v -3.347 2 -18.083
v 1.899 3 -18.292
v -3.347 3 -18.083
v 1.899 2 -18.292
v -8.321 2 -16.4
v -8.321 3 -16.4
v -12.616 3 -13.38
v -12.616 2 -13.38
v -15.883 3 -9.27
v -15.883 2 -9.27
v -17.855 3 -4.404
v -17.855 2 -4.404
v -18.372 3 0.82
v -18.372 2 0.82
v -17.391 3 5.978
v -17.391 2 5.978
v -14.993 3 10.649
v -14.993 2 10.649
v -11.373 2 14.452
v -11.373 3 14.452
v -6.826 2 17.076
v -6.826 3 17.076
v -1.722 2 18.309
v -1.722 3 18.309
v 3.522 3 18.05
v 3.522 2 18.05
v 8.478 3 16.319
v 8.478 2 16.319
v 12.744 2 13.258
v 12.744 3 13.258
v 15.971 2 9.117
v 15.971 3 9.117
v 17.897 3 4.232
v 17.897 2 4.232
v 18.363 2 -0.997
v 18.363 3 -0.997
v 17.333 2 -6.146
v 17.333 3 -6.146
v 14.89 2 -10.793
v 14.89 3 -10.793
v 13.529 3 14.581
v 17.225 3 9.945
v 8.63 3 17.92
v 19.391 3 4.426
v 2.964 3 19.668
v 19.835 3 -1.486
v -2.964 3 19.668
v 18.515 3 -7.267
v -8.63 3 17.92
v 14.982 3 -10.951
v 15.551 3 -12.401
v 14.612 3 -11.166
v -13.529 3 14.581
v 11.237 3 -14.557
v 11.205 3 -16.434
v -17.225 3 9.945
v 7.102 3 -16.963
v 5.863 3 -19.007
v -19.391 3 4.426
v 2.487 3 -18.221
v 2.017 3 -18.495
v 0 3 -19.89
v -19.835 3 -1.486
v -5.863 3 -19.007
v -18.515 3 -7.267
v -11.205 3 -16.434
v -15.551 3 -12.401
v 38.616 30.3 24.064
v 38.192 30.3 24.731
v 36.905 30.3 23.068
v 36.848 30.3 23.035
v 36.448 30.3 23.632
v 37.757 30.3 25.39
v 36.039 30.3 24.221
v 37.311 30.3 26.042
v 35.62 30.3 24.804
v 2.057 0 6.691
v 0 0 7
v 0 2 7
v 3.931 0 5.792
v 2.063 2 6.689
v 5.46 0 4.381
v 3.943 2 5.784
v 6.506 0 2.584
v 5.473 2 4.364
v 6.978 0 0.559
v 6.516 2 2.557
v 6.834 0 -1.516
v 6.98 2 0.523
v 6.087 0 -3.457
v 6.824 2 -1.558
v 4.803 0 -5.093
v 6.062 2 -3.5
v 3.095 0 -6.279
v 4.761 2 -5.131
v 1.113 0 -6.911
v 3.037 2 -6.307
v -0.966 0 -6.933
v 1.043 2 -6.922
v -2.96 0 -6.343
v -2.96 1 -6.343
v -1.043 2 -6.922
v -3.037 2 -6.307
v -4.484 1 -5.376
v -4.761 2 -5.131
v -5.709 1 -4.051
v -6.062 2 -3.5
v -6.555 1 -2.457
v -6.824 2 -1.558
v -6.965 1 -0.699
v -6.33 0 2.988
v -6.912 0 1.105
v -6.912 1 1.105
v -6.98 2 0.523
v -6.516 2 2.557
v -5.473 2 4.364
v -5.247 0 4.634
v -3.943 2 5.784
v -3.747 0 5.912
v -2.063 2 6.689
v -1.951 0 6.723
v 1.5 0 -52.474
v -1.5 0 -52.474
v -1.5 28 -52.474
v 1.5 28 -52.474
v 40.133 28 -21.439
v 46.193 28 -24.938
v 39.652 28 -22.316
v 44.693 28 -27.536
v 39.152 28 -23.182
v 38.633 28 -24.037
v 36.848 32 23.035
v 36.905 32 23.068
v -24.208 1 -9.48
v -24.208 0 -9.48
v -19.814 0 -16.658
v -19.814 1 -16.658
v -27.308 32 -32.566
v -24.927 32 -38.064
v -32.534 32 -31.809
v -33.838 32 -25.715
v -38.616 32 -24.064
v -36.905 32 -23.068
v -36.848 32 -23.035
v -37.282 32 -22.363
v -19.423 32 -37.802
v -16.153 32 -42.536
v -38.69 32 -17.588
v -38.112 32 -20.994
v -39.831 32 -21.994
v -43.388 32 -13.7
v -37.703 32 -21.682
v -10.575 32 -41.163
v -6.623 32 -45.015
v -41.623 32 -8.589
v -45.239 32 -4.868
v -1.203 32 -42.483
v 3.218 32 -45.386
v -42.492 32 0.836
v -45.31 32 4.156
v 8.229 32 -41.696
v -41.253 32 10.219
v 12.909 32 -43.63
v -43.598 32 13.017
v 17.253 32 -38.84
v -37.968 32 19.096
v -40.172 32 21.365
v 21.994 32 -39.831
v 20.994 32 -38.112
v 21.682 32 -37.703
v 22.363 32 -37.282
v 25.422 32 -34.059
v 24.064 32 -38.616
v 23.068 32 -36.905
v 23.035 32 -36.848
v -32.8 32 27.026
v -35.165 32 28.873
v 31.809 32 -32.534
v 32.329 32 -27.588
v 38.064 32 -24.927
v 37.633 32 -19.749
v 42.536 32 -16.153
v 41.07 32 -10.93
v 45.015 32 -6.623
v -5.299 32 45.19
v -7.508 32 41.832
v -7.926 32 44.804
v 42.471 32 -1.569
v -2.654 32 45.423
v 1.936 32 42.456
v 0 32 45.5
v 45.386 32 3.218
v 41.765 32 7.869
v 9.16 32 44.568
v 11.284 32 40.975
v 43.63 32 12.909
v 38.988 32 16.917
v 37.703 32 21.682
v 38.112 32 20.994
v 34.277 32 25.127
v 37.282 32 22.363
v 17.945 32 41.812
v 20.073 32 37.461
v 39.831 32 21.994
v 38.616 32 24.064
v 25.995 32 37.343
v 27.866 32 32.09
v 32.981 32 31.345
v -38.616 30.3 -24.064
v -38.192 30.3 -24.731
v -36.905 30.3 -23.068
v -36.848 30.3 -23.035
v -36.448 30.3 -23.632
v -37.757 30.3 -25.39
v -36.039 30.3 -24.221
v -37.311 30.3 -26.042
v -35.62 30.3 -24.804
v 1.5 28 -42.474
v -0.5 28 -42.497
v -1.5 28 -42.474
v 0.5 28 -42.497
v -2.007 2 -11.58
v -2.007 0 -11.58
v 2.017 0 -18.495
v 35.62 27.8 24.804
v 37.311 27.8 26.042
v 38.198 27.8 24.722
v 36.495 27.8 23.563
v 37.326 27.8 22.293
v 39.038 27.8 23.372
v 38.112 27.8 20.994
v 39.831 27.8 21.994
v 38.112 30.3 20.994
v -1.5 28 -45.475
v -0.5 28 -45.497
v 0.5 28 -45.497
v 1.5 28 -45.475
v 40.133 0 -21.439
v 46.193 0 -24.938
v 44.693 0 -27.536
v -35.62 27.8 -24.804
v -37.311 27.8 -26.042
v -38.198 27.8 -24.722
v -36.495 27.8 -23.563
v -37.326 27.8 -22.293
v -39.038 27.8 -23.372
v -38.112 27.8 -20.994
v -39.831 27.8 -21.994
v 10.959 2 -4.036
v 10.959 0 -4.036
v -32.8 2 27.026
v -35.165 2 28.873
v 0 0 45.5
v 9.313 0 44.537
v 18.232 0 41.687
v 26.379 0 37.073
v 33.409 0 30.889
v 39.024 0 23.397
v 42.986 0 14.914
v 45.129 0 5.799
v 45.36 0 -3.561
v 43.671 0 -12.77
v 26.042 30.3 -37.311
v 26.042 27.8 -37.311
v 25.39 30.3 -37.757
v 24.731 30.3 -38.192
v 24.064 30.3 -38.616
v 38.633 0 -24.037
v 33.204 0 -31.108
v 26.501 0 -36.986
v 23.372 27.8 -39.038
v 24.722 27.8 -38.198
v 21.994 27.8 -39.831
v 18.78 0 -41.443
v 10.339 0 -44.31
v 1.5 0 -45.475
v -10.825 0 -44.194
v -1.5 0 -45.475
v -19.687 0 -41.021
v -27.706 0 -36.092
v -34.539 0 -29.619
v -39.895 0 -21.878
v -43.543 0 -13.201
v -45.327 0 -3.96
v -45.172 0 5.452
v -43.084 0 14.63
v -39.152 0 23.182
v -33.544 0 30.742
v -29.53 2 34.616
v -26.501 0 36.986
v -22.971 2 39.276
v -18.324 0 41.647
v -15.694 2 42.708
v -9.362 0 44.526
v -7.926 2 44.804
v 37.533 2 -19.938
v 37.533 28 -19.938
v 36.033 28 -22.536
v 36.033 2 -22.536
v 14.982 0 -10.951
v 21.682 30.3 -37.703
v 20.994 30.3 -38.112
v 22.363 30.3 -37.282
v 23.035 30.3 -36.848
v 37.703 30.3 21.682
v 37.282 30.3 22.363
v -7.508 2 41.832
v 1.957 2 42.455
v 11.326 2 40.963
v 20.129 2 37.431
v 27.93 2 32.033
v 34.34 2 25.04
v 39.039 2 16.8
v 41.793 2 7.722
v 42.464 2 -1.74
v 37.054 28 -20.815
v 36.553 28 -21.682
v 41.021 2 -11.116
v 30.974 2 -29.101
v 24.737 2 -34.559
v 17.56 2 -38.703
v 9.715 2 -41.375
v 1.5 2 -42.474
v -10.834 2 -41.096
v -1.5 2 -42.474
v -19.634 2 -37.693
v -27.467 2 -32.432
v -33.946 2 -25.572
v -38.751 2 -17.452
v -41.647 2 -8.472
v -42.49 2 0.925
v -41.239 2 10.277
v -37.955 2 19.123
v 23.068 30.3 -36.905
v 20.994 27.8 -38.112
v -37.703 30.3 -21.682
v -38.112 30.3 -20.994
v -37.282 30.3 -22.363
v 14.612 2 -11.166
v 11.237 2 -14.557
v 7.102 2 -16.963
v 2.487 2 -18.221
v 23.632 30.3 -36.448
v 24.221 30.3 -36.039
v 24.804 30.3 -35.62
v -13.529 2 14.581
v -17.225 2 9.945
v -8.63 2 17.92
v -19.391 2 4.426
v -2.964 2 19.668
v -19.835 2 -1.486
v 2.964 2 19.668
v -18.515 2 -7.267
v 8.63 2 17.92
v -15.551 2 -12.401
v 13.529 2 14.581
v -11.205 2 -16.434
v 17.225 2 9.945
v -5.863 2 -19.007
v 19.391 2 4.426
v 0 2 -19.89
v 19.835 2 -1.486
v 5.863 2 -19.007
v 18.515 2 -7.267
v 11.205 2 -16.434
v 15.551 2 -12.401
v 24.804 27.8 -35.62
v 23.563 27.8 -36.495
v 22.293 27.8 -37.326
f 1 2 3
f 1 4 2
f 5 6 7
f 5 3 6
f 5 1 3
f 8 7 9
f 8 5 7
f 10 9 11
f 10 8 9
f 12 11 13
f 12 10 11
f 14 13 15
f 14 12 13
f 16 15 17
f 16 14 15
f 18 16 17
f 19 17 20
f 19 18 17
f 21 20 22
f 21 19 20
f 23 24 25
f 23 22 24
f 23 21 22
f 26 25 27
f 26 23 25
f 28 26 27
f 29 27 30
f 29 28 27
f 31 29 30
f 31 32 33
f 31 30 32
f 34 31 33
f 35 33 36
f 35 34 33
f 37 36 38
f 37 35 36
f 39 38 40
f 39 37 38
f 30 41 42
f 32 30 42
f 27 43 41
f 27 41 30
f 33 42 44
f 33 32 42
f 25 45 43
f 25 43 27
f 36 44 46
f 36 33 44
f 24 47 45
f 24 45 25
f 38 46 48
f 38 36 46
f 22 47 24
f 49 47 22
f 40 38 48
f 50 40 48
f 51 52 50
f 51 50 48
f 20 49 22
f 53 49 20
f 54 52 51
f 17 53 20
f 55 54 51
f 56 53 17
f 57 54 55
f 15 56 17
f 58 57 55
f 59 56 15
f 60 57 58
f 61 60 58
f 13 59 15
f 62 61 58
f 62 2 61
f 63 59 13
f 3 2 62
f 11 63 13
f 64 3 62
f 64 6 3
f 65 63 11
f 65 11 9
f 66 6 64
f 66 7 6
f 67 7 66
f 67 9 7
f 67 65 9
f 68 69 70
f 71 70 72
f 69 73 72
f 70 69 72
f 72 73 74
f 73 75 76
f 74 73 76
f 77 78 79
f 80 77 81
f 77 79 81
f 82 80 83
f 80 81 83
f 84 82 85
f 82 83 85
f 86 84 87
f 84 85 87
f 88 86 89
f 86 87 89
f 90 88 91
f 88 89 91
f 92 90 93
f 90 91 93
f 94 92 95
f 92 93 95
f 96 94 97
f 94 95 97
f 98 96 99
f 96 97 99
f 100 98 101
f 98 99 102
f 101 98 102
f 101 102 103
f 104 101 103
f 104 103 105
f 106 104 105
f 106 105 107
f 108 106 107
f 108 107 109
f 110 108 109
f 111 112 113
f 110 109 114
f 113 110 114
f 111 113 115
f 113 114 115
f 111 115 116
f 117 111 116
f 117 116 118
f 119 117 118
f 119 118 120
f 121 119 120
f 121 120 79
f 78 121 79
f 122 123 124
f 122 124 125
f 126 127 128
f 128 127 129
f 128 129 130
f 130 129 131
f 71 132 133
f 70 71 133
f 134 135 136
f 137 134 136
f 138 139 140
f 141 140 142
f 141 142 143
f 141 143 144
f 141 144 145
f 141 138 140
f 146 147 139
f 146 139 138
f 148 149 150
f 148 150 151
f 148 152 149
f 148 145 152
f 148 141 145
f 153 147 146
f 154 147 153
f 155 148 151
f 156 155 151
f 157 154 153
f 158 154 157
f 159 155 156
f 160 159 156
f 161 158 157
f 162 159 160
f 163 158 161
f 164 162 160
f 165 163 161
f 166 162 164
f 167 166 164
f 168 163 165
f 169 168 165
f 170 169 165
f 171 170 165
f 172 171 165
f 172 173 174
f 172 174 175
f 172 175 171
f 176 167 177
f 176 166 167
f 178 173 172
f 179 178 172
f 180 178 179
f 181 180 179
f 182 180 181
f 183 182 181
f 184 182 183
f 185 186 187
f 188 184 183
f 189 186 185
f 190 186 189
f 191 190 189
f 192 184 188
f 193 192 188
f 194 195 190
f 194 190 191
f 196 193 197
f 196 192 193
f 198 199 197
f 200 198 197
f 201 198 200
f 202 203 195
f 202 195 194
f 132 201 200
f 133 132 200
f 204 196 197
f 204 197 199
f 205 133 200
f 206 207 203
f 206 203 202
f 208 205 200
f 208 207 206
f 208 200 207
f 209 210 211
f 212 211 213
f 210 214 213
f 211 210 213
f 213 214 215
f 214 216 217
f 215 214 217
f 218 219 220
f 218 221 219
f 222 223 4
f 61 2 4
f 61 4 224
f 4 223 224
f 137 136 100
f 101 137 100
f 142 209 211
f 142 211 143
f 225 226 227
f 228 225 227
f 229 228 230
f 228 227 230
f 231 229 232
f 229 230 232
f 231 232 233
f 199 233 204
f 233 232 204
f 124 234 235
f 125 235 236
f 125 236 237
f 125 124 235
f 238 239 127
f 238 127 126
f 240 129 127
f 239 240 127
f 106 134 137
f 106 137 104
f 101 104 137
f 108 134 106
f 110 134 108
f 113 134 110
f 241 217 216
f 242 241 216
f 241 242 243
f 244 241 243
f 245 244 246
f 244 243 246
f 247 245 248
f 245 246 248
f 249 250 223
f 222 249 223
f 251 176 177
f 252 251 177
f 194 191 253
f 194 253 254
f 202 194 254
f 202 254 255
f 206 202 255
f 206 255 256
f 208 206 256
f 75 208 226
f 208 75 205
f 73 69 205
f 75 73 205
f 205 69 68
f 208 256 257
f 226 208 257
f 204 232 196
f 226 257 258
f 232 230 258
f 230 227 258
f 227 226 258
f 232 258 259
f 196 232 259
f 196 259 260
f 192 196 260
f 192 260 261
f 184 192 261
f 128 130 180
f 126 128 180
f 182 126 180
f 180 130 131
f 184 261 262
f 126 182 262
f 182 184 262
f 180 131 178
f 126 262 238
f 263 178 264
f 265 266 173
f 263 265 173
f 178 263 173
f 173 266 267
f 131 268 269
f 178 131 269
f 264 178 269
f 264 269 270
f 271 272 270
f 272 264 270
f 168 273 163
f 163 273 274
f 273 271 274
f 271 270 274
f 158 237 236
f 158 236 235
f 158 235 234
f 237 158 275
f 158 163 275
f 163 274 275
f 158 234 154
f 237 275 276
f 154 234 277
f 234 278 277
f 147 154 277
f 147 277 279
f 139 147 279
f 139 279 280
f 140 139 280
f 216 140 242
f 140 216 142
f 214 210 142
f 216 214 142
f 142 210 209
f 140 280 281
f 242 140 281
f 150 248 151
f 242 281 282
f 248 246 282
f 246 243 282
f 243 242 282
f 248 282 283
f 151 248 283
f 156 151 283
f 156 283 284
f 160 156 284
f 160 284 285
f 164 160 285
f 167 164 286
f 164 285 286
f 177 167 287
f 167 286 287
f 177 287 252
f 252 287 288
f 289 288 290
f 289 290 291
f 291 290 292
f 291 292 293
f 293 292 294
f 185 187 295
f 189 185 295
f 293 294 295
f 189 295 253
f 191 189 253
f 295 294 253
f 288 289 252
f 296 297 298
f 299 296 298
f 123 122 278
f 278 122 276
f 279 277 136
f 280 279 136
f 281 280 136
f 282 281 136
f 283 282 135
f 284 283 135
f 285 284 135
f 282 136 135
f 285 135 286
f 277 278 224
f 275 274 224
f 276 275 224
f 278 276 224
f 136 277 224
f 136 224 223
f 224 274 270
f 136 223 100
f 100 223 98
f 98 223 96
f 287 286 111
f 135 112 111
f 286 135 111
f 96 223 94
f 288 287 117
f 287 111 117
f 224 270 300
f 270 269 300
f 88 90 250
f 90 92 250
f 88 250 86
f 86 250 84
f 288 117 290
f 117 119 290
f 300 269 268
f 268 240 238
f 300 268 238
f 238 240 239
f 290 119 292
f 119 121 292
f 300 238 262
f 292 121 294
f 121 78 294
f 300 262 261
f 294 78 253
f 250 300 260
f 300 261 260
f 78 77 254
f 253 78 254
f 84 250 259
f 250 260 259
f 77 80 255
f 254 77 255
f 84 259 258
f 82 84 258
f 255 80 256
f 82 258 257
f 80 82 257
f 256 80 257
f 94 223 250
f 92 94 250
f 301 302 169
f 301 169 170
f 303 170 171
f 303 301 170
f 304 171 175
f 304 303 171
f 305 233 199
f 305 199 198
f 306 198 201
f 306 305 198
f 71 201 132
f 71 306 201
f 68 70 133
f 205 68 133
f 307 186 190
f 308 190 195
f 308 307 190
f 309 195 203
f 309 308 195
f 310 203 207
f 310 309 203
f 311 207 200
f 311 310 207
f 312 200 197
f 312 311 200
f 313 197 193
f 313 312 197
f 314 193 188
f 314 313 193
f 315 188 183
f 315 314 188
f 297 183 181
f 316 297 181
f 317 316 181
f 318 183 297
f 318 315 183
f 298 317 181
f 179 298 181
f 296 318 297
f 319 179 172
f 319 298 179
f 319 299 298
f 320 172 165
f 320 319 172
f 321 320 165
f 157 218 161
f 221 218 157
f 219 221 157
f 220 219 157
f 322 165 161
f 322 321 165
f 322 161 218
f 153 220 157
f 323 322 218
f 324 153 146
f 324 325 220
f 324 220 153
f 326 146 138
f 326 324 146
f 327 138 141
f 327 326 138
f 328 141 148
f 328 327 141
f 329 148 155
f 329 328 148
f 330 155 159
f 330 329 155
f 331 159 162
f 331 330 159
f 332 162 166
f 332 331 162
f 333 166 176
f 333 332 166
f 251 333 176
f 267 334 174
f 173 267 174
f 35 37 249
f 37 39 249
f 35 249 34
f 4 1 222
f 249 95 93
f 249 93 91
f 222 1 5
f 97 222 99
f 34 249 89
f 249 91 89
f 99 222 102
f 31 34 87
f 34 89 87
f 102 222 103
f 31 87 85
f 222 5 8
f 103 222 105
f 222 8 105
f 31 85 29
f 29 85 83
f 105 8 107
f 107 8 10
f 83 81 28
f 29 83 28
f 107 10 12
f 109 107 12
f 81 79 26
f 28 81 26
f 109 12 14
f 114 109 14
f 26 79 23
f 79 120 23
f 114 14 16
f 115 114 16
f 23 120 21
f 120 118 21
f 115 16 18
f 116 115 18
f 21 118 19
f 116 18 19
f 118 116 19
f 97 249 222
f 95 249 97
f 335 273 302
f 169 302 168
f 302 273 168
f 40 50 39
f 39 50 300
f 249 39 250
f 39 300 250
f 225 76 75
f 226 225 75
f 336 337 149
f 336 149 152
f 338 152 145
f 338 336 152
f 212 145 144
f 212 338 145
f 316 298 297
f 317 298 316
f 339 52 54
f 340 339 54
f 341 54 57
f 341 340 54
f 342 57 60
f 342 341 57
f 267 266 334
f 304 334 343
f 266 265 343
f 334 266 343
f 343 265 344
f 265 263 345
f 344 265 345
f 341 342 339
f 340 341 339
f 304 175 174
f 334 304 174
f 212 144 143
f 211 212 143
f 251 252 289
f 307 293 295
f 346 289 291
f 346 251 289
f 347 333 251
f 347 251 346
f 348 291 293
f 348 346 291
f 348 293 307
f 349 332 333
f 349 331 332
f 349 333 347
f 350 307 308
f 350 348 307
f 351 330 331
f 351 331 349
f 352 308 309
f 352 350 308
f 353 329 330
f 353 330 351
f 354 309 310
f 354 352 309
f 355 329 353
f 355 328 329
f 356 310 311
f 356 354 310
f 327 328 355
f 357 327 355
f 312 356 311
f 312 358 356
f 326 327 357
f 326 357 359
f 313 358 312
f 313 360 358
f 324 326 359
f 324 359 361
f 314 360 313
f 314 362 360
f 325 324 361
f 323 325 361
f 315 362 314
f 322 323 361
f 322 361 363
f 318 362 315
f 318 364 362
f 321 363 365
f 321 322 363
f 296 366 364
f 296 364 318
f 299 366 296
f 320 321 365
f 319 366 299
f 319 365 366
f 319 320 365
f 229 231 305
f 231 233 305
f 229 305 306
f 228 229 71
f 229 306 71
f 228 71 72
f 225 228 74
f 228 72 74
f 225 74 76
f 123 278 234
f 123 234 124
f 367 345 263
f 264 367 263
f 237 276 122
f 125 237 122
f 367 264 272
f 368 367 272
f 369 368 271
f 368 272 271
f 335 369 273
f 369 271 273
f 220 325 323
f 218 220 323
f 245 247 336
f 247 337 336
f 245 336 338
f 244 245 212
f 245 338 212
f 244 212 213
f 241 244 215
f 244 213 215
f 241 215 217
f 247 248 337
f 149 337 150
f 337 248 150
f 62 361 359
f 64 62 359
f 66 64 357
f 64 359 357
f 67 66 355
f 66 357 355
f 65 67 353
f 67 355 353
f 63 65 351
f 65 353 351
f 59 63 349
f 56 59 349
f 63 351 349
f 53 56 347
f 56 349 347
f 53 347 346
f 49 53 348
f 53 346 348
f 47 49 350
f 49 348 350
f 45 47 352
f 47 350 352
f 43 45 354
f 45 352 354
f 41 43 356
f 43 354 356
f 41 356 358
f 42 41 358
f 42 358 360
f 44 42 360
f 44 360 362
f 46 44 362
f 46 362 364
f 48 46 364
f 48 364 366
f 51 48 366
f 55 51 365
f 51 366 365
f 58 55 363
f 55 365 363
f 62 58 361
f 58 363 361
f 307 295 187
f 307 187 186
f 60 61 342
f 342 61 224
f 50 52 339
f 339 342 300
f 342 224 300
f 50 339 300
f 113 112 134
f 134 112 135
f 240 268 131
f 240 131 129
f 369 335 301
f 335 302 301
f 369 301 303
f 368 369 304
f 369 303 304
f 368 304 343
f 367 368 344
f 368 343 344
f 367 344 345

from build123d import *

# Parameters (mm, degrees)
SKETCH1_R                = 45.5
SKETCH1_R_2              = 42.5
BOSS_EXTRUDE1_DEPTH      = 32
SKETCH2_R                = 45.5
BOSS_EXTRUDE2_DEPTH      = 2
SKETCH3_R                = 7
CUT_EXTRUDE1_DEPTH       = 2
BOSS_EXTRUDE4_DEPTH      = 26
BOSS_EXTRUDE4_DEPTH_BACK = 2
SKETCH7_W                = 3
SKETCH7_H                = 10
SKETCH8_R                = 19.890165718
SKETCH8_R_2              = 18.390165718
BOSS_EXTRUDE5_DEPTH      = 1
CUT_EXTRUDE4_DEPTH       = 5.5
CUT_EXTRUDE5_DEPTH       = 58.5
CUT_EXTRUDE6_DEPTH       = 1
SKETCH13_W               = 2.4
SKETCH13_H               = 4.2
CUT_EXTRUDE7_DEPTH       = 2
SKETCH14_W               = 2.232083317
SKETCH14_H               = 2.5
CUT_REVOLVE1_ANGLE       = 6
CUT_REVOLVE2_START       = 30.3
CUT_REVOLVE2_DEPTH       = 1.7
CIRPATTERN1_COUNT        = 4
CUT_REVOLVE3_START       = 30.3
CUT_REVOLVE3_DEPTH       = 1.7
CUT_REVOLVE4_START       = 30.3
CUT_REVOLVE4_DEPTH       = 1.7


# Read off the part's stored shape, not the designer's step: Cut-Revolve2, Cut-Revolve3, Cut-Revolve4
with BuildPart() as part:
    # Sketch1 → Boss-Extrude1 (new body)
    with BuildSketch(Plane(origin=(0, 0, 0), x_dir=(1, 0, 0), z_dir=(0, 1, 0))):
        with Locations(Location((0, 0, 0), (0, 0, 270))):
            Circle(SKETCH1_R)
        with Locations(Location((0, 0, 0), (0, 0, 270))):
            Circle(SKETCH1_R_2, mode=Mode.SUBTRACT)
    extrude(amount=BOSS_EXTRUDE1_DEPTH)

    # Sketch2 → Boss-Extrude2 (add)
    with BuildSketch(Plane.XZ):
        with Locations(Location((0, 0, 0), (0, 0, 90))):
            Circle(SKETCH2_R)
    extrude(amount=-BOSS_EXTRUDE2_DEPTH)

    # Sketch3 → Cut-Extrude1 (cut)
    with BuildSketch(Plane(origin=(0, 2, 0), x_dir=(1, 0, 0), z_dir=(0, 1, 0))):
        with Locations(Location((0, 0, 0), (0, 0, 270))):
            Circle(SKETCH3_R)
    extrude(amount=-CUT_EXTRUDE1_DEPTH, mode=Mode.SUBTRACT)

    # Sketch7 → Boss-Extrude4 (add, two sides: drawn at the far end of the back side and taken through both)
    with BuildSketch(Plane(origin=(0, 2, 0), x_dir=(1, 0, 0), z_dir=(0, 1, 0)).offset(-BOSS_EXTRUDE4_DEPTH_BACK)):
        with Locations((0, 47.473521163)):
            Rectangle(SKETCH7_W, SKETCH7_H)
        Polygon((46.193402353, 24.937722476), (37.533148315, 19.937722476), (36.033148315, 22.535798687), (44.693402353, 27.535798687), align=None)
    extrude(amount=BOSS_EXTRUDE4_DEPTH + BOSS_EXTRUDE4_DEPTH_BACK)

    # Sketch8 → Boss-Extrude5 (add)
    with BuildSketch(Plane(origin=(0, 2, 0), x_dir=(1, 0, 0), z_dir=(0, 1, 0))):
        with Locations(Location((0, 0, 0), (0, 0, 90))):
            Circle(SKETCH8_R)
        with Locations(Location((0, 0, 0), (0, 0, 270))):
            Circle(SKETCH8_R_2, mode=Mode.SUBTRACT)
    extrude(amount=BOSS_EXTRUDE5_DEPTH)

    # Sketch10 → Cut-Extrude4 (cut)
    with BuildSketch(Plane.XZ):
        Polygon((2.016687189, -18.494703278), (14.981867268, -10.951222284), (10.958677405, -4.036459575), (-2.006502675, -11.579940569), align=None)
    extrude(amount=-CUT_EXTRUDE4_DEPTH, mode=Mode.SUBTRACT)

    # Sketch11 → Cut-Extrude5 (cut)
    with BuildSketch(Plane(origin=(0, 2, 0), x_dir=(1, 0, 0), z_dir=(0, 1, 0))):
        Polygon((-32.606600292, -26.874098434), (-35.165226496, -28.87311631), (-33.824988888, -37.754161376), (-11.7382848, -48.772412552), (-7.925983096, -44.804338986), (-7.495155029, -41.738838001), (-9.978475631, -35.419229659), (-25.965270809, -26.874098434), align=None)
    extrude(amount=CUT_EXTRUDE5_DEPTH, mode=Mode.SUBTRACT)

    # Sketch12 → Cut-Extrude6 (cut)
    with BuildSketch(Plane.XZ):
        Polygon((-6.912265346, 1.104802147), (-24.20763883, -9.480307189), (-19.814483018, -16.658435267), (-2.519109534, -6.073325931), align=None)
    extrude(amount=-CUT_EXTRUDE6_DEPTH, mode=Mode.SUBTRACT)

    # Sketch13 → Cut-Extrude7 (cut)
    with BuildSketch(Plane(origin=(22.881892348, 0, -39.327712908), x_dir=(-0.8643453386317811, 0, -0.5028987329328956), z_dir=(0.5028987329328954, 0, -0.864345338631781))):
        with Locations((-0.179431701, 29.9)):
            Rectangle(SKETCH13_W, SKETCH13_H)
    cut_extrude7 = extrude(amount=-CUT_EXTRUDE7_DEPTH, mode=Mode.SUBTRACT)

    # Sketch14 → Cut-Revolve1 (revolve, cut)
    with BuildSketch(Plane(origin=(-0.882123452, 0, -0.513242504), x_dir=(0.5028987329328954, 0, -0.8643453386317812), z_dir=(0.8643453386317812, 0, 0.5028987329328954))):
        with Locations((44.616041659, 29.05)):
            Rectangle(SKETCH14_W, SKETCH14_H)
    cut_revolve1 = revolve(axis=Axis((-0.882123452, 0, -0.513242504), (0, -1, 0)), revolution_arc=CUT_REVOLVE1_ANGLE, mode=Mode.SUBTRACT)

    # Cut-Revolve2 outline → Cut-Revolve2 (cut)
    with BuildSketch(Plane(origin=(0, 0, 0), x_dir=(1, 0, 0), z_dir=(0, 1, 0)).offset(CUT_REVOLVE2_START)):
        with BuildLine():
            ThreePointArc((20.993971431, 38.112264735), (22.023249251, 37.494236289), (23.035079503, 36.848038538))
            Line((23.035079503, 36.848038538), (23.068400244, 36.905307776))
            Line((23.068400244, 36.905307776), (20.993971431, 38.112264735))
        make_face()
    extrude(amount=CUT_REVOLVE2_DEPTH, mode=Mode.SUBTRACT)

    # CirPattern1: Cut-Extrude7, Cut-Revolve1 ×4 about axis
    cirpattern1_axis = Axis((0, 0, 0), (0, 1, 0))
    add([cut_extrude7.rotate(cirpattern1_axis, i * 360 / CIRPATTERN1_COUNT) for i in range(1, CIRPATTERN1_COUNT)], mode=Mode.SUBTRACT)
    add([cut_revolve1.rotate(cirpattern1_axis, i * 360 / CIRPATTERN1_COUNT) for i in range(1, CIRPATTERN1_COUNT)], mode=Mode.SUBTRACT)

    # Cut-Revolve3 outline → Cut-Revolve3 (cut)
    with BuildSketch(Plane(origin=(0, 0, 0), x_dir=(1, 0, 0), z_dir=(0, 1, 0)).offset(CUT_REVOLVE3_START)):
        with BuildLine():
            ThreePointArc((38.112264735, -20.993971431), (37.494236289, -22.023249251), (36.848038538, -23.035079503))
            Line((36.848038538, -23.035079503), (36.905307776, -23.068400244))
            Line((36.905307776, -23.068400244), (38.112264735, -20.993971431))
        make_face()
    extrude(amount=CUT_REVOLVE3_DEPTH, mode=Mode.SUBTRACT)

    # Cut-Revolve4 outline → Cut-Revolve4 (cut)
    with BuildSketch(Plane(origin=(0, 0, 0), x_dir=(1, 0, 0), z_dir=(0, 1, 0)).offset(CUT_REVOLVE4_START)):
        with BuildLine():
            ThreePointArc((-38.112264735, 20.993971431), (-37.494236289, 22.023249251), (-36.848038538, 23.035079503))
            Line((-36.848038538, 23.035079503), (-36.905307776, 23.068400244))
            Line((-36.905307776, 23.068400244), (-38.112264735, 20.993971431))
        make_face()
    extrude(amount=CUT_REVOLVE4_DEPTH, mode=Mode.SUBTRACT)


solid = part.part
